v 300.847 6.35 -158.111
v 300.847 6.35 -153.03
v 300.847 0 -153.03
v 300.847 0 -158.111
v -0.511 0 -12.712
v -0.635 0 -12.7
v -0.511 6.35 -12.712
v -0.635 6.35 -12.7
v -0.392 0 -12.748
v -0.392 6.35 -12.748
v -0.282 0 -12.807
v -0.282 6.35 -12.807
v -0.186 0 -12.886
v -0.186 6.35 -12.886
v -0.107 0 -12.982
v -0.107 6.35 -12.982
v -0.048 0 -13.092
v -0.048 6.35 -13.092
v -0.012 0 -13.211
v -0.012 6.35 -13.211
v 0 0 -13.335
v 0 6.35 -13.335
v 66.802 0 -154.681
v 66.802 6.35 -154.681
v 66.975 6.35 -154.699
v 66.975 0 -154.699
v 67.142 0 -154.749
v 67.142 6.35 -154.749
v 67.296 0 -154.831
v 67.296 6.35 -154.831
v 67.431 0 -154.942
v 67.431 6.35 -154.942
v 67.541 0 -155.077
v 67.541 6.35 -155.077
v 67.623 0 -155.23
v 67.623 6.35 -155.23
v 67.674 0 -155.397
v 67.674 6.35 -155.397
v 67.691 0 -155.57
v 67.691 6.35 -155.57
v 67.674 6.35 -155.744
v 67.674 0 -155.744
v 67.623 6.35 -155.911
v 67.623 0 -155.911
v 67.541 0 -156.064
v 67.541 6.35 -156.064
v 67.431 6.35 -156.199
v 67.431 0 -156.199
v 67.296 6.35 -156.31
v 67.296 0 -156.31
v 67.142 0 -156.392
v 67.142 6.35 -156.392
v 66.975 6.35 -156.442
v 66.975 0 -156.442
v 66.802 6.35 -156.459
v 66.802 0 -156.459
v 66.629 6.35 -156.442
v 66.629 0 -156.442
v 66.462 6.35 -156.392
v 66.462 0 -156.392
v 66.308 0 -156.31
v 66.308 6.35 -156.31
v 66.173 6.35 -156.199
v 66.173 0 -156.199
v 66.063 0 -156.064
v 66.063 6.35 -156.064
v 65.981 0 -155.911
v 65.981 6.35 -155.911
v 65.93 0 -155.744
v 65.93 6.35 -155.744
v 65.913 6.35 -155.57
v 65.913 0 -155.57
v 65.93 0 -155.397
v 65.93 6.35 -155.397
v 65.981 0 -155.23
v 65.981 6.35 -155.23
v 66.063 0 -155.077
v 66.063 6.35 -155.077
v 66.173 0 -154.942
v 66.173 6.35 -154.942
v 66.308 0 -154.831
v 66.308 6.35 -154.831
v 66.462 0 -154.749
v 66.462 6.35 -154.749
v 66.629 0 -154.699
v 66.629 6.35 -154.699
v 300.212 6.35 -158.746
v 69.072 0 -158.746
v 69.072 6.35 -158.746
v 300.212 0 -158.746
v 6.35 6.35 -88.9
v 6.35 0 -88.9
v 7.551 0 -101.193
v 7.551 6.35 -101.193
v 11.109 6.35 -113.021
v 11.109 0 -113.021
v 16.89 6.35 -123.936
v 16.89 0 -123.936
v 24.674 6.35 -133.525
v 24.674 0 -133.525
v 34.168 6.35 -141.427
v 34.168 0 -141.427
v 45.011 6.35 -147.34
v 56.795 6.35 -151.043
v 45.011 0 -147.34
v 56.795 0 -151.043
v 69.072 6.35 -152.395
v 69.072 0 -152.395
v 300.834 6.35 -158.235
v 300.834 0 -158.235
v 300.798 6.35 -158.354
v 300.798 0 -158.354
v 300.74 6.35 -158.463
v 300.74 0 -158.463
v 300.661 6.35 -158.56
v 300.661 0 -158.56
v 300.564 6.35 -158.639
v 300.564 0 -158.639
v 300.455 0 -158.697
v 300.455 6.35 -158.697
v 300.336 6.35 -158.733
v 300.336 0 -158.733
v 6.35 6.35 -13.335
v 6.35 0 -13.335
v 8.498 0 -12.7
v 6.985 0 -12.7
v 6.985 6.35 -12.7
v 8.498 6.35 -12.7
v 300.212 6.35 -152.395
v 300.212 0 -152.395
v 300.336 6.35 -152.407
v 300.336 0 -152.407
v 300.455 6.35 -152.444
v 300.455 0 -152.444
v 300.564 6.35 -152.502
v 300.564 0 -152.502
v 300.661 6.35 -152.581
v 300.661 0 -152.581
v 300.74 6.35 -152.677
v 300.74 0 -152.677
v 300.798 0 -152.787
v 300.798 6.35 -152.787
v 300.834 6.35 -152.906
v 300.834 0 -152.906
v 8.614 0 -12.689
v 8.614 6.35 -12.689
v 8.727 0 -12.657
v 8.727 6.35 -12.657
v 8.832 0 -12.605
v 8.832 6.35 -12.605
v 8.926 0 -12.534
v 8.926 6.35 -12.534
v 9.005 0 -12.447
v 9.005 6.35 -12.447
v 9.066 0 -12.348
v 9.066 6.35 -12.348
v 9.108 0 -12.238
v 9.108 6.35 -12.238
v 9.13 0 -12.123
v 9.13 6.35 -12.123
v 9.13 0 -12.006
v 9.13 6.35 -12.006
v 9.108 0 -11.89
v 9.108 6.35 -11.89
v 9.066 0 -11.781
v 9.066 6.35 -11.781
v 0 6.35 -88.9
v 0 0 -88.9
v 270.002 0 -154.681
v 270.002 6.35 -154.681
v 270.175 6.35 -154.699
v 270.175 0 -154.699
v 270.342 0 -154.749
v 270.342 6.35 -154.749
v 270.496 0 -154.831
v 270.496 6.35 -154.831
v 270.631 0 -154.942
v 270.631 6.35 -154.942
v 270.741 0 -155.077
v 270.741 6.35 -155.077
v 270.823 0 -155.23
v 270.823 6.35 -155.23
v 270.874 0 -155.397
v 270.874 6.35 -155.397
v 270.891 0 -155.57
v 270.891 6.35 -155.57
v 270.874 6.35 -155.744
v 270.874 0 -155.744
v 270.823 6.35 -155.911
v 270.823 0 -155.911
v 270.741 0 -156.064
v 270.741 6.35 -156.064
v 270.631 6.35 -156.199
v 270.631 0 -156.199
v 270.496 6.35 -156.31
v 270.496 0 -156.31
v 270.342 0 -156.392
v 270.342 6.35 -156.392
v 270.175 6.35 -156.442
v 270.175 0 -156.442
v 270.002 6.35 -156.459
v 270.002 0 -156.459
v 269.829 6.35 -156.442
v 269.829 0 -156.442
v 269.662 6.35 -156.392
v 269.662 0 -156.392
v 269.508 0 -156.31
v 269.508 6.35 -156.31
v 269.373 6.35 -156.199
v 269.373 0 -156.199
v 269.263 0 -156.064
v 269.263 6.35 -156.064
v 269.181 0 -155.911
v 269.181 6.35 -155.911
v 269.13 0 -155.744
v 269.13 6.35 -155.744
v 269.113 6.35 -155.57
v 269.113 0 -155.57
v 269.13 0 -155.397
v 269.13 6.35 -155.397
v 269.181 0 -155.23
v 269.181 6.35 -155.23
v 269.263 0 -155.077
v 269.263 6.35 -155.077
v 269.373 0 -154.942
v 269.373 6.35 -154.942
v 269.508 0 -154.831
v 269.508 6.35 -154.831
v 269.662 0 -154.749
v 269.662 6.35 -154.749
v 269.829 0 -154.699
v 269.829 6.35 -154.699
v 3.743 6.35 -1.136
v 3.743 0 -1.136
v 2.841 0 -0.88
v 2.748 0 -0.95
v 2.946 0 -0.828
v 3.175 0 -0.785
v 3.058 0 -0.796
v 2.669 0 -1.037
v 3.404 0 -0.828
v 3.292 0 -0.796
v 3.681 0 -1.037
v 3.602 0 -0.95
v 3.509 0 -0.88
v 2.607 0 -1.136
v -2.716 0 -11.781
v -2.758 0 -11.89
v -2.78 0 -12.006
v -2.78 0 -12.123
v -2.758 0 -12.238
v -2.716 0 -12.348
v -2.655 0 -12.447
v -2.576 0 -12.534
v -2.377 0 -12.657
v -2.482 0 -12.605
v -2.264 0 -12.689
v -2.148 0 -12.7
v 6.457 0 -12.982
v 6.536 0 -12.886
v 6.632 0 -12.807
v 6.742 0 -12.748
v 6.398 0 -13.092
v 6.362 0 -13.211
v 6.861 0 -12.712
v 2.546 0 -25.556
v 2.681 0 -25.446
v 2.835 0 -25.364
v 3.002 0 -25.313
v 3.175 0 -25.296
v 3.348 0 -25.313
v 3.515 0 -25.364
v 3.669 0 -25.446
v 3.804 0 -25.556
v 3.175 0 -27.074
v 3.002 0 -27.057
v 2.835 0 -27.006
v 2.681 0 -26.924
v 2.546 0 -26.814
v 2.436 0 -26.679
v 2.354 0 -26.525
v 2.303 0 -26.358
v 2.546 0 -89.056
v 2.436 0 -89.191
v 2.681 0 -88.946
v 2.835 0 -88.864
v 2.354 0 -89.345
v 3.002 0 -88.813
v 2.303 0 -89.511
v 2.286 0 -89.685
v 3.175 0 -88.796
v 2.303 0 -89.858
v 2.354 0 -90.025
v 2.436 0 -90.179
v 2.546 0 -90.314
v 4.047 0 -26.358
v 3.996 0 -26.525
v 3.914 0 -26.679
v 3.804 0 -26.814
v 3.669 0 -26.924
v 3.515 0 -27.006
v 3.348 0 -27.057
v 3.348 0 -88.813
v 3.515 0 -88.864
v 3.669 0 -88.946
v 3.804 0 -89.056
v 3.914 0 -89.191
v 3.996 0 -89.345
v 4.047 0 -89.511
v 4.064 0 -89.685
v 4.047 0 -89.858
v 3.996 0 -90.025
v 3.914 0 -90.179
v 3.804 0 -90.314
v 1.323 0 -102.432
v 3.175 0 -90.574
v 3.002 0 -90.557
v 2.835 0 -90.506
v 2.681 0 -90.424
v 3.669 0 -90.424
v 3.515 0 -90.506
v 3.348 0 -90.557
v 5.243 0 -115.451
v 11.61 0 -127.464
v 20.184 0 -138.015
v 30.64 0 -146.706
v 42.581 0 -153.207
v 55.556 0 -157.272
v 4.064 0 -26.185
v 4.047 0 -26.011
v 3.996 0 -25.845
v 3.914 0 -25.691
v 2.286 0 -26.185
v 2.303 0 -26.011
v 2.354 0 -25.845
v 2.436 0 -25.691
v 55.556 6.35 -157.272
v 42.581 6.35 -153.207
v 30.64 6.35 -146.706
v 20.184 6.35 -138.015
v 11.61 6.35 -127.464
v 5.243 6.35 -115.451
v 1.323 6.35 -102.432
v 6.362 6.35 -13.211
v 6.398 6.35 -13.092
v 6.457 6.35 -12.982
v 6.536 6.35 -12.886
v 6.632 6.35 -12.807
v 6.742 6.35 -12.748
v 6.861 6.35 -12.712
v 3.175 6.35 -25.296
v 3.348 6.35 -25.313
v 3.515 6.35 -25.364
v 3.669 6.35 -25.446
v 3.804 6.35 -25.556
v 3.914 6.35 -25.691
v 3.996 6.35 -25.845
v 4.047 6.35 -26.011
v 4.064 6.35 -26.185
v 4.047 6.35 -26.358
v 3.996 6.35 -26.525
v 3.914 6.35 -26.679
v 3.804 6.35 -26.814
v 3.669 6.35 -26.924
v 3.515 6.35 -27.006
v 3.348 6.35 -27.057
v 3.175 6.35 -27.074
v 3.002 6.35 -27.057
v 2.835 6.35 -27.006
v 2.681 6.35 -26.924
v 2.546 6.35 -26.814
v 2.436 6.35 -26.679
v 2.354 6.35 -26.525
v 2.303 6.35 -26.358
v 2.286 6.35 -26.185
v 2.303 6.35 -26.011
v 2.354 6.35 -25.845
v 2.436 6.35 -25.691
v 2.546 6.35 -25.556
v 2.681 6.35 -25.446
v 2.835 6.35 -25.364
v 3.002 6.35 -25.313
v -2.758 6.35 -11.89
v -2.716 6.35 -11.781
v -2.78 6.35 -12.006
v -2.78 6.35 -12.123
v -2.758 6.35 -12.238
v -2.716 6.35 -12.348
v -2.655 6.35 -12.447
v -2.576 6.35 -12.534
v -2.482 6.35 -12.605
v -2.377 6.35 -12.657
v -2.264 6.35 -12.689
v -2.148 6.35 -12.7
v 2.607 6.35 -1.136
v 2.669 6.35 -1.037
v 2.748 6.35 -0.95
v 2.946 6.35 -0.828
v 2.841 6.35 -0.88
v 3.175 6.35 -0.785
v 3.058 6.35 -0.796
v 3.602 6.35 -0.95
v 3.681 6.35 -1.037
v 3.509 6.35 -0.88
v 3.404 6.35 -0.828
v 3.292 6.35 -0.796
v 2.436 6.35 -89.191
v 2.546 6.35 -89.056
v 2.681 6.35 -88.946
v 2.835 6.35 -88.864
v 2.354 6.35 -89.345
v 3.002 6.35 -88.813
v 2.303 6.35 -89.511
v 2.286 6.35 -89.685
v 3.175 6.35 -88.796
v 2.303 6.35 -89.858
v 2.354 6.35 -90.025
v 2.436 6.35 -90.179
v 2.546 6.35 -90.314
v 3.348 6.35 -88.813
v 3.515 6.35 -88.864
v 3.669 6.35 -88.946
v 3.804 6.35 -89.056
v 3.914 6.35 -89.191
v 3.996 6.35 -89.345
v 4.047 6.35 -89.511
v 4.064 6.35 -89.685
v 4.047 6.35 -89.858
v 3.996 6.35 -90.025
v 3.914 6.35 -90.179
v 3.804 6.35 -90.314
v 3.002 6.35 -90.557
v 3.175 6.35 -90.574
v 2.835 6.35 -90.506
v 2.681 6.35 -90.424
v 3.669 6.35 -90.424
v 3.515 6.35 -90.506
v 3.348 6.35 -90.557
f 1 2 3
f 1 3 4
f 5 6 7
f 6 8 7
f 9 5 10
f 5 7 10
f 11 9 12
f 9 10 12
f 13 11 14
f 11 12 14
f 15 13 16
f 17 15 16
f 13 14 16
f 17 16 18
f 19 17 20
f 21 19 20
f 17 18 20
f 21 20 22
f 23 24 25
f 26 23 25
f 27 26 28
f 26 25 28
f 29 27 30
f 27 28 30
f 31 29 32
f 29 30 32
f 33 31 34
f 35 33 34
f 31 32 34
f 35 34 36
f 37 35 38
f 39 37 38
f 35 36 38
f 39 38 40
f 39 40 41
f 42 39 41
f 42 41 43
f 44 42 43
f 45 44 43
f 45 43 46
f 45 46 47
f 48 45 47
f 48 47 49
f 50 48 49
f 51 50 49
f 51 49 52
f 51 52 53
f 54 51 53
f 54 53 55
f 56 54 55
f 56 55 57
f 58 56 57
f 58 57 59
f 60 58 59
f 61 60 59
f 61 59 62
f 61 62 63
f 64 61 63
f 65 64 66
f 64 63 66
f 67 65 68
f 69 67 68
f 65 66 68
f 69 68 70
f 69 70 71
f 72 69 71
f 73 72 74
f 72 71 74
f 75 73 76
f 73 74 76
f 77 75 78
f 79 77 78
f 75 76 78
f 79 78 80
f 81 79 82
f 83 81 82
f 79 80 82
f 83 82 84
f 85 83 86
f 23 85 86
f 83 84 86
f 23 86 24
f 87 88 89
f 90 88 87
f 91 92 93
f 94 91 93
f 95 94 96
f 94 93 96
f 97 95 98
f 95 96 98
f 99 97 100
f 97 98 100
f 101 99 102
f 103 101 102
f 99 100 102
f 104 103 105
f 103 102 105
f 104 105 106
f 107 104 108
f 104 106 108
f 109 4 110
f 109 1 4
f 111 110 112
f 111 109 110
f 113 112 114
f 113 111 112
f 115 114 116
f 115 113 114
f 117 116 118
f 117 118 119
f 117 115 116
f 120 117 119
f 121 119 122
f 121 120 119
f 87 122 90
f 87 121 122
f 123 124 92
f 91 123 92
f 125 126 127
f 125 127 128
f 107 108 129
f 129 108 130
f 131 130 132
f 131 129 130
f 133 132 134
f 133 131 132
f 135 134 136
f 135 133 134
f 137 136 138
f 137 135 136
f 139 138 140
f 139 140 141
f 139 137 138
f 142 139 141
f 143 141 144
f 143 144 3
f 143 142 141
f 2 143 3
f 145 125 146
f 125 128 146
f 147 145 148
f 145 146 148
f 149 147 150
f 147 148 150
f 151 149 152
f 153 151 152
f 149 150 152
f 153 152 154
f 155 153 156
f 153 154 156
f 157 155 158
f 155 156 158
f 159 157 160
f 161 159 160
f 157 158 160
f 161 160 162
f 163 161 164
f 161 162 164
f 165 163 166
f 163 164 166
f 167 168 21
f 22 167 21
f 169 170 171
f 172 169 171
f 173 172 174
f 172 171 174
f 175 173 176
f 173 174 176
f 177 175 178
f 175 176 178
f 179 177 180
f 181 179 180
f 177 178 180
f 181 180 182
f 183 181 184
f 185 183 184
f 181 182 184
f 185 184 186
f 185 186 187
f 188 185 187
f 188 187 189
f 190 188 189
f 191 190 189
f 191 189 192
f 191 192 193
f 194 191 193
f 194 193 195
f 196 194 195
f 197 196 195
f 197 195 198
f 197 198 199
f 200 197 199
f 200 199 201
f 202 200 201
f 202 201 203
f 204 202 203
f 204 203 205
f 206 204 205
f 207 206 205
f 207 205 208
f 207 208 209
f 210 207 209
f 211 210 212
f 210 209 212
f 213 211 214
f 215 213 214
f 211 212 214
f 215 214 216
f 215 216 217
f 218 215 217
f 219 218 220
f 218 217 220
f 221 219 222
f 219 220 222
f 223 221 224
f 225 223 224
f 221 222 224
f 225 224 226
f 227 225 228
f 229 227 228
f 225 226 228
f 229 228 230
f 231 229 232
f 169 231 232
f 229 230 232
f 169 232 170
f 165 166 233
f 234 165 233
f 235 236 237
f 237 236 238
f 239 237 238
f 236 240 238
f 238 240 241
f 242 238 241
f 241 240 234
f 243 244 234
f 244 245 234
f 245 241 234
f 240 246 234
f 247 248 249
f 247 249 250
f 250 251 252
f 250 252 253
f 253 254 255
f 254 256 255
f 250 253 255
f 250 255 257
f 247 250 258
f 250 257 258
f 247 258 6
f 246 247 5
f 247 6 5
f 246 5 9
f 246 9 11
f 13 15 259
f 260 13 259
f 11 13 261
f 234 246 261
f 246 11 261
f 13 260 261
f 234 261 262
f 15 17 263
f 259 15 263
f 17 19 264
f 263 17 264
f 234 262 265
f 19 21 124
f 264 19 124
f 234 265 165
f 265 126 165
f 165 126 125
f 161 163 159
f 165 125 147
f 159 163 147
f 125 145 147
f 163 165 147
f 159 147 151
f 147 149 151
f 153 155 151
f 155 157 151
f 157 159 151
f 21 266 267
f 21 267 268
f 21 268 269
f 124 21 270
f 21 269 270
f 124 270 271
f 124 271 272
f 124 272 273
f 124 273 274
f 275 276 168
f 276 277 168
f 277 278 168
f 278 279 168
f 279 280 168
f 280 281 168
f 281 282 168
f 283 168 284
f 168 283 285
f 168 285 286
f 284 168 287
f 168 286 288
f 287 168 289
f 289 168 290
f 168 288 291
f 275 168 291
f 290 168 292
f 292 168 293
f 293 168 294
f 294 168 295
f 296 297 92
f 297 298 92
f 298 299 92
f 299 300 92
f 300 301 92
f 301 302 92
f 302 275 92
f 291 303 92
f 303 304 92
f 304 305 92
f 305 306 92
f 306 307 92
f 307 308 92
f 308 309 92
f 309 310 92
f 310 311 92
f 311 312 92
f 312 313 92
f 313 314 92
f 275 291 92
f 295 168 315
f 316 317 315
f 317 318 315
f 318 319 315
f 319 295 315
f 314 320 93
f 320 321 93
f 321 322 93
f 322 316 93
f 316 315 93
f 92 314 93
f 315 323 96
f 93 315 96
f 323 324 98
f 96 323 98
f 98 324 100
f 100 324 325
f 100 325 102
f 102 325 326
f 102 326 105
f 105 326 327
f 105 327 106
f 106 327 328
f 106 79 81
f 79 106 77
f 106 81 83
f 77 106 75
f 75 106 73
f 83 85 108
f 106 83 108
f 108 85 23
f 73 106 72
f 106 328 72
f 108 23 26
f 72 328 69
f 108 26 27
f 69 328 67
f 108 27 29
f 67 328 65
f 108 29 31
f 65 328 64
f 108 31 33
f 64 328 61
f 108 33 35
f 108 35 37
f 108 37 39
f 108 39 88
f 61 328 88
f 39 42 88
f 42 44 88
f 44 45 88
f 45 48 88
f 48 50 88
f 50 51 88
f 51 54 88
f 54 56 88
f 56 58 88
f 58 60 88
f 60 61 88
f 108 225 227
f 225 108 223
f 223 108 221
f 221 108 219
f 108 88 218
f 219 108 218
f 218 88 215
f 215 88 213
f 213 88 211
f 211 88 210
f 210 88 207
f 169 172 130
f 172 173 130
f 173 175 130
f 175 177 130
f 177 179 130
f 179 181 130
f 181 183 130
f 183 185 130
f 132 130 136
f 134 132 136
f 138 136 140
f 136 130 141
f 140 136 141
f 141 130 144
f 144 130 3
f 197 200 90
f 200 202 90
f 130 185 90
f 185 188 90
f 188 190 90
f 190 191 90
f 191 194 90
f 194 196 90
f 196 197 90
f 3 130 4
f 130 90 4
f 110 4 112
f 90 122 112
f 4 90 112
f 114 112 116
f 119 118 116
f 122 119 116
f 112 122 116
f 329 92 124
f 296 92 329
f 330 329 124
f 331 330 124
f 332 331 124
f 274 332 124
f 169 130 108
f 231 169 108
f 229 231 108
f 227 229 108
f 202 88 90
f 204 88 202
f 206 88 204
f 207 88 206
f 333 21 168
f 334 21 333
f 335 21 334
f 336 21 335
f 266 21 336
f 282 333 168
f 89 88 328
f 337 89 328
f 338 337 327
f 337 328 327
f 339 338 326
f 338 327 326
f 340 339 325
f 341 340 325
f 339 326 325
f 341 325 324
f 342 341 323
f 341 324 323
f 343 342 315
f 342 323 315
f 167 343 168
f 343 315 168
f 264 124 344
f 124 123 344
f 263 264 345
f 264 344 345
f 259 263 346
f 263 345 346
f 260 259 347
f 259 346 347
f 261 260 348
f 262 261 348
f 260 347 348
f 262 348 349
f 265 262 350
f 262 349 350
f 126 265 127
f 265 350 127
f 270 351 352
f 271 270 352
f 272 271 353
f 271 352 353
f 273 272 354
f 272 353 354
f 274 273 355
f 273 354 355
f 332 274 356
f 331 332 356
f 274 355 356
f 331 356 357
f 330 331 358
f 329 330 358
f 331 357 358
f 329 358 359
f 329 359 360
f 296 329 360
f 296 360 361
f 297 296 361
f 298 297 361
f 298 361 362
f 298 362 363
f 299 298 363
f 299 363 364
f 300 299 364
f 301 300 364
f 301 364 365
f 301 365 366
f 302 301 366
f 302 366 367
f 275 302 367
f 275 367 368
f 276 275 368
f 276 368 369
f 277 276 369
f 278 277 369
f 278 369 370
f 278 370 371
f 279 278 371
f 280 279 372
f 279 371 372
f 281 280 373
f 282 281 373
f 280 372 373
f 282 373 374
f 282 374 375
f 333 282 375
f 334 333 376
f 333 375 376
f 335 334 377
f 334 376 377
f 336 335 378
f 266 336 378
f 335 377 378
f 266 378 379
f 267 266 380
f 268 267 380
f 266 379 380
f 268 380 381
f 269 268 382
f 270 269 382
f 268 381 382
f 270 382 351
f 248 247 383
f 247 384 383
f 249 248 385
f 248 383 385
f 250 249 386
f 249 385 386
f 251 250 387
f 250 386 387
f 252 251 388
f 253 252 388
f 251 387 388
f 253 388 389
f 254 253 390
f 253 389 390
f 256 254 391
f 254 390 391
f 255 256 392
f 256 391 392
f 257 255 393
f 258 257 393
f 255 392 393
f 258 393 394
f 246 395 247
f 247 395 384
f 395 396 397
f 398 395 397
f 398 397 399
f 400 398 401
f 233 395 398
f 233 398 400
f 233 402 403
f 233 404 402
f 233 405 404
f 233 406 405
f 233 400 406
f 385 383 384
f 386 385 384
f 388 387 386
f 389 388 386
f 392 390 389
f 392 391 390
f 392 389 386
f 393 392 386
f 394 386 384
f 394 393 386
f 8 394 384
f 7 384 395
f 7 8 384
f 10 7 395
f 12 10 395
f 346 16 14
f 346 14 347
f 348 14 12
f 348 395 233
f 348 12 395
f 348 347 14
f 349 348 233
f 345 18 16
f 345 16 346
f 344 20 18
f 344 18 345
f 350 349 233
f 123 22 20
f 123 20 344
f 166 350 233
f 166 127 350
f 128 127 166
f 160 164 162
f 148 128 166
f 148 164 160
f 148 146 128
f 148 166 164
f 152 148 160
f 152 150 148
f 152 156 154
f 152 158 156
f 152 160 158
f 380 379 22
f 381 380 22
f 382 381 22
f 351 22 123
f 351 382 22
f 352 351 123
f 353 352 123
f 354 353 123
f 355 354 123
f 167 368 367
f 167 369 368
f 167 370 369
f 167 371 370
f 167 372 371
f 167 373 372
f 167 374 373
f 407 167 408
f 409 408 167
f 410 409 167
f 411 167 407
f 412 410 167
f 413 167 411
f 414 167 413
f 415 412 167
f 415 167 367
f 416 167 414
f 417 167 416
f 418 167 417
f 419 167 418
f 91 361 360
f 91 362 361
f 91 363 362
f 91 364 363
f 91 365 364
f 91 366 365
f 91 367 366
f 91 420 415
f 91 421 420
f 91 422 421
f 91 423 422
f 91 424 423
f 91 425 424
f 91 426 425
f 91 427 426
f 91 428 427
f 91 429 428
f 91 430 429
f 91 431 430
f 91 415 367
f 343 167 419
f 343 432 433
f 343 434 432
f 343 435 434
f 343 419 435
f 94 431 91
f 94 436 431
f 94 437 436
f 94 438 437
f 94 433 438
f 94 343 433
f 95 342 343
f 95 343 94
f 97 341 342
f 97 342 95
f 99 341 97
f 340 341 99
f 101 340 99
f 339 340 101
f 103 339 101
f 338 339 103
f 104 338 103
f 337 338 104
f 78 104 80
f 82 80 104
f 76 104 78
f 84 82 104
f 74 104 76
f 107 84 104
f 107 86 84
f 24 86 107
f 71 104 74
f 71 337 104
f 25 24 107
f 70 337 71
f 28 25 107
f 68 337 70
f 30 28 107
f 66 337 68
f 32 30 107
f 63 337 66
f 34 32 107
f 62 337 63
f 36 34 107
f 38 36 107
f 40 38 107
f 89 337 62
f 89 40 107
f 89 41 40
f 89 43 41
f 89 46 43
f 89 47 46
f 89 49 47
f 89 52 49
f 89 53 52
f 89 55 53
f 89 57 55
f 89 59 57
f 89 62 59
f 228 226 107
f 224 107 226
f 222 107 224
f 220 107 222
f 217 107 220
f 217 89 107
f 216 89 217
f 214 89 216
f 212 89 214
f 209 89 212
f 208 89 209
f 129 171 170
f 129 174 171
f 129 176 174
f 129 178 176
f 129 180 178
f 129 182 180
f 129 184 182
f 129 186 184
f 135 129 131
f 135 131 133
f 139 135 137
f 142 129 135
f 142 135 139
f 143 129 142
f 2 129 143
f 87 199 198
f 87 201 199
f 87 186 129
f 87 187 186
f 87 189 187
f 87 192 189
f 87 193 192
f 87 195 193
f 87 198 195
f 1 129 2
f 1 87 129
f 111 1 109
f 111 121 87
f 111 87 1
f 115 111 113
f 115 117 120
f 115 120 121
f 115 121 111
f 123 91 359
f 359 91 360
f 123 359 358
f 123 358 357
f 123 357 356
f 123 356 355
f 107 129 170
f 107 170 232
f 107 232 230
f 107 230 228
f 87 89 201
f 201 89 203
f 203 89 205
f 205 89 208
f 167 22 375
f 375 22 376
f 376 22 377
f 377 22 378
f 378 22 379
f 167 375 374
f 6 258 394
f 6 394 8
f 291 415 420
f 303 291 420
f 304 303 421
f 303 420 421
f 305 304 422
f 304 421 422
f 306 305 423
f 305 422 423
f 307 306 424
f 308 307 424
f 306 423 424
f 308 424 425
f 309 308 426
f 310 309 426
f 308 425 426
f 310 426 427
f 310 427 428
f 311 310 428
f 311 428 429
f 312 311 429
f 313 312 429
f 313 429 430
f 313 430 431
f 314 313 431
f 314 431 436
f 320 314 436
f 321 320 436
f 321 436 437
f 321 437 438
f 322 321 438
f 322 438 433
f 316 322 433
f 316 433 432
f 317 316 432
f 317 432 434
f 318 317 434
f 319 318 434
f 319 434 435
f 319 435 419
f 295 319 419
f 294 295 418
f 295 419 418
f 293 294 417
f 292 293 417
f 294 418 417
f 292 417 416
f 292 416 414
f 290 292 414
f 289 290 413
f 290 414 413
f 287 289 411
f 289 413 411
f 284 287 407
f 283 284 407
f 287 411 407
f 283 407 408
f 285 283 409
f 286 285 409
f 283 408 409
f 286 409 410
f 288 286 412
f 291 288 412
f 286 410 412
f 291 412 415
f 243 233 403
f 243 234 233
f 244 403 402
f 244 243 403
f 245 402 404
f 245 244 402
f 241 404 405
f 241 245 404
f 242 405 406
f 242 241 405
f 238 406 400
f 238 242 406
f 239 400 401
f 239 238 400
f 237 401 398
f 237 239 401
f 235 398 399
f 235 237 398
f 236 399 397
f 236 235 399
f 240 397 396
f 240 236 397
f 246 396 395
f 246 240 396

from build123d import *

# Parameters (mm, degrees)
SKETCH1_W           = 231.775
SKETCH1_H           = 6.350433672
SKETCH1_W_2         = 6.35
SKETCH1_H_2         = 76.2
SKETCH1_H_3         = 12.7
SKETCH1_W_3         = 3.175
BOSS_EXTRUDE1_DEPTH = 6.35
CUT_EXTRUDE1_DEPTH  = 341.219392139
FILLET1_R           = 0.635
SKETCH3_R           = 0.889
CUT_EXTRUDE2_DEPTH  = 341.219392139


with BuildPart() as part:
    # Sketch1 → Boss-Extrude1 (new body)
    with BuildSketch(Plane(origin=(0, 0, 0), x_dir=(1, 0, 0), z_dir=(0, 1, 0))):
        with Locations((184.959182845, 155.570446755)):
            Rectangle(SKETCH1_W, SKETCH1_H)
        with BuildLine():
            Line((69.071682845, 152.395229919), (69.071682845, 158.745663591))
            ThreePointArc((69.071682845, 158.745663591), (20.184176976, 138.015461144), (0, 88.9))
            Line((0, 88.9), (6.35, 88.9))
            ThreePointArc((6.35, 88.9), (24.674380805, 133.525255521), (69.071682845, 152.395229919))
        make_face()
        with Locations((3.175, 50.8)):
            Rectangle(SKETCH1_W_2, SKETCH1_H_2)
        with Locations((3.175, 6.35)):
            Rectangle(SKETCH1_W_2, SKETCH1_H_3)
        with Locations((-1.5875, 6.35)):
            Rectangle(SKETCH1_W_3, SKETCH1_H_3)
        with Locations((7.9375, 6.35)):
            Rectangle(SKETCH1_W_3, SKETCH1_H_3)
    extrude(amount=BOSS_EXTRUDE1_DEPTH)

    # Sketch2 → Cut-Extrude1 (cut, through all)
    with BuildSketch(Plane(origin=(0, 6.35, 0), x_dir=(1, 0, 0), z_dir=(0, 1, 0))):
        Polygon((3.175, 0), (-3.175, 12.7), (-3.175, 0), align=None)
        Polygon((9.525, 12.7), (3.175, 0), (9.525, 0), align=None)
    extrude(amount=-CUT_EXTRUDE1_DEPTH, mode=Mode.SUBTRACT)

    # Fillet1
    fillet1_edges = [part.edges().sort_by_distance(p)[0] for p in [
        (0, 3.175, -12.7),
        (300.846682845, 3.175, -158.745663591),
        (300.846682845, 3.175, -152.395229919),
        (6.35, 3.175, -12.7),
        (-3.175, 3.175, -12.7),
        (9.525, 3.175, -12.7),
        (3.175, 3.175, 0),
    ]]
    fillet(fillet1_edges, radius=FILLET1_R)

    # Sketch3 → Cut-Extrude2 (cut, through all)
    with BuildSketch(Plane(origin=(0, 6.35, 0), x_dir=(1, 0, 0), z_dir=(0, 1, 0))):
        with Locations(Location((3.175, 26.184903166, 0), (0, 0, 270))):
            Circle(SKETCH3_R)
        with Locations(Location((3.175, 89.684903166, 0), (0, 0, 270))):
            Circle(SKETCH3_R)
        with Locations(Location((66.802, 155.570446755, 0), (0, 0, 270))):
            Circle(SKETCH3_R)
        with Locations(Location((270.002, 155.570446755, 0), (0, 0, 270))):
            Circle(SKETCH3_R)
    extrude(amount=-CUT_EXTRUDE2_DEPTH, mode=Mode.SUBTRACT)


solid = part.part
